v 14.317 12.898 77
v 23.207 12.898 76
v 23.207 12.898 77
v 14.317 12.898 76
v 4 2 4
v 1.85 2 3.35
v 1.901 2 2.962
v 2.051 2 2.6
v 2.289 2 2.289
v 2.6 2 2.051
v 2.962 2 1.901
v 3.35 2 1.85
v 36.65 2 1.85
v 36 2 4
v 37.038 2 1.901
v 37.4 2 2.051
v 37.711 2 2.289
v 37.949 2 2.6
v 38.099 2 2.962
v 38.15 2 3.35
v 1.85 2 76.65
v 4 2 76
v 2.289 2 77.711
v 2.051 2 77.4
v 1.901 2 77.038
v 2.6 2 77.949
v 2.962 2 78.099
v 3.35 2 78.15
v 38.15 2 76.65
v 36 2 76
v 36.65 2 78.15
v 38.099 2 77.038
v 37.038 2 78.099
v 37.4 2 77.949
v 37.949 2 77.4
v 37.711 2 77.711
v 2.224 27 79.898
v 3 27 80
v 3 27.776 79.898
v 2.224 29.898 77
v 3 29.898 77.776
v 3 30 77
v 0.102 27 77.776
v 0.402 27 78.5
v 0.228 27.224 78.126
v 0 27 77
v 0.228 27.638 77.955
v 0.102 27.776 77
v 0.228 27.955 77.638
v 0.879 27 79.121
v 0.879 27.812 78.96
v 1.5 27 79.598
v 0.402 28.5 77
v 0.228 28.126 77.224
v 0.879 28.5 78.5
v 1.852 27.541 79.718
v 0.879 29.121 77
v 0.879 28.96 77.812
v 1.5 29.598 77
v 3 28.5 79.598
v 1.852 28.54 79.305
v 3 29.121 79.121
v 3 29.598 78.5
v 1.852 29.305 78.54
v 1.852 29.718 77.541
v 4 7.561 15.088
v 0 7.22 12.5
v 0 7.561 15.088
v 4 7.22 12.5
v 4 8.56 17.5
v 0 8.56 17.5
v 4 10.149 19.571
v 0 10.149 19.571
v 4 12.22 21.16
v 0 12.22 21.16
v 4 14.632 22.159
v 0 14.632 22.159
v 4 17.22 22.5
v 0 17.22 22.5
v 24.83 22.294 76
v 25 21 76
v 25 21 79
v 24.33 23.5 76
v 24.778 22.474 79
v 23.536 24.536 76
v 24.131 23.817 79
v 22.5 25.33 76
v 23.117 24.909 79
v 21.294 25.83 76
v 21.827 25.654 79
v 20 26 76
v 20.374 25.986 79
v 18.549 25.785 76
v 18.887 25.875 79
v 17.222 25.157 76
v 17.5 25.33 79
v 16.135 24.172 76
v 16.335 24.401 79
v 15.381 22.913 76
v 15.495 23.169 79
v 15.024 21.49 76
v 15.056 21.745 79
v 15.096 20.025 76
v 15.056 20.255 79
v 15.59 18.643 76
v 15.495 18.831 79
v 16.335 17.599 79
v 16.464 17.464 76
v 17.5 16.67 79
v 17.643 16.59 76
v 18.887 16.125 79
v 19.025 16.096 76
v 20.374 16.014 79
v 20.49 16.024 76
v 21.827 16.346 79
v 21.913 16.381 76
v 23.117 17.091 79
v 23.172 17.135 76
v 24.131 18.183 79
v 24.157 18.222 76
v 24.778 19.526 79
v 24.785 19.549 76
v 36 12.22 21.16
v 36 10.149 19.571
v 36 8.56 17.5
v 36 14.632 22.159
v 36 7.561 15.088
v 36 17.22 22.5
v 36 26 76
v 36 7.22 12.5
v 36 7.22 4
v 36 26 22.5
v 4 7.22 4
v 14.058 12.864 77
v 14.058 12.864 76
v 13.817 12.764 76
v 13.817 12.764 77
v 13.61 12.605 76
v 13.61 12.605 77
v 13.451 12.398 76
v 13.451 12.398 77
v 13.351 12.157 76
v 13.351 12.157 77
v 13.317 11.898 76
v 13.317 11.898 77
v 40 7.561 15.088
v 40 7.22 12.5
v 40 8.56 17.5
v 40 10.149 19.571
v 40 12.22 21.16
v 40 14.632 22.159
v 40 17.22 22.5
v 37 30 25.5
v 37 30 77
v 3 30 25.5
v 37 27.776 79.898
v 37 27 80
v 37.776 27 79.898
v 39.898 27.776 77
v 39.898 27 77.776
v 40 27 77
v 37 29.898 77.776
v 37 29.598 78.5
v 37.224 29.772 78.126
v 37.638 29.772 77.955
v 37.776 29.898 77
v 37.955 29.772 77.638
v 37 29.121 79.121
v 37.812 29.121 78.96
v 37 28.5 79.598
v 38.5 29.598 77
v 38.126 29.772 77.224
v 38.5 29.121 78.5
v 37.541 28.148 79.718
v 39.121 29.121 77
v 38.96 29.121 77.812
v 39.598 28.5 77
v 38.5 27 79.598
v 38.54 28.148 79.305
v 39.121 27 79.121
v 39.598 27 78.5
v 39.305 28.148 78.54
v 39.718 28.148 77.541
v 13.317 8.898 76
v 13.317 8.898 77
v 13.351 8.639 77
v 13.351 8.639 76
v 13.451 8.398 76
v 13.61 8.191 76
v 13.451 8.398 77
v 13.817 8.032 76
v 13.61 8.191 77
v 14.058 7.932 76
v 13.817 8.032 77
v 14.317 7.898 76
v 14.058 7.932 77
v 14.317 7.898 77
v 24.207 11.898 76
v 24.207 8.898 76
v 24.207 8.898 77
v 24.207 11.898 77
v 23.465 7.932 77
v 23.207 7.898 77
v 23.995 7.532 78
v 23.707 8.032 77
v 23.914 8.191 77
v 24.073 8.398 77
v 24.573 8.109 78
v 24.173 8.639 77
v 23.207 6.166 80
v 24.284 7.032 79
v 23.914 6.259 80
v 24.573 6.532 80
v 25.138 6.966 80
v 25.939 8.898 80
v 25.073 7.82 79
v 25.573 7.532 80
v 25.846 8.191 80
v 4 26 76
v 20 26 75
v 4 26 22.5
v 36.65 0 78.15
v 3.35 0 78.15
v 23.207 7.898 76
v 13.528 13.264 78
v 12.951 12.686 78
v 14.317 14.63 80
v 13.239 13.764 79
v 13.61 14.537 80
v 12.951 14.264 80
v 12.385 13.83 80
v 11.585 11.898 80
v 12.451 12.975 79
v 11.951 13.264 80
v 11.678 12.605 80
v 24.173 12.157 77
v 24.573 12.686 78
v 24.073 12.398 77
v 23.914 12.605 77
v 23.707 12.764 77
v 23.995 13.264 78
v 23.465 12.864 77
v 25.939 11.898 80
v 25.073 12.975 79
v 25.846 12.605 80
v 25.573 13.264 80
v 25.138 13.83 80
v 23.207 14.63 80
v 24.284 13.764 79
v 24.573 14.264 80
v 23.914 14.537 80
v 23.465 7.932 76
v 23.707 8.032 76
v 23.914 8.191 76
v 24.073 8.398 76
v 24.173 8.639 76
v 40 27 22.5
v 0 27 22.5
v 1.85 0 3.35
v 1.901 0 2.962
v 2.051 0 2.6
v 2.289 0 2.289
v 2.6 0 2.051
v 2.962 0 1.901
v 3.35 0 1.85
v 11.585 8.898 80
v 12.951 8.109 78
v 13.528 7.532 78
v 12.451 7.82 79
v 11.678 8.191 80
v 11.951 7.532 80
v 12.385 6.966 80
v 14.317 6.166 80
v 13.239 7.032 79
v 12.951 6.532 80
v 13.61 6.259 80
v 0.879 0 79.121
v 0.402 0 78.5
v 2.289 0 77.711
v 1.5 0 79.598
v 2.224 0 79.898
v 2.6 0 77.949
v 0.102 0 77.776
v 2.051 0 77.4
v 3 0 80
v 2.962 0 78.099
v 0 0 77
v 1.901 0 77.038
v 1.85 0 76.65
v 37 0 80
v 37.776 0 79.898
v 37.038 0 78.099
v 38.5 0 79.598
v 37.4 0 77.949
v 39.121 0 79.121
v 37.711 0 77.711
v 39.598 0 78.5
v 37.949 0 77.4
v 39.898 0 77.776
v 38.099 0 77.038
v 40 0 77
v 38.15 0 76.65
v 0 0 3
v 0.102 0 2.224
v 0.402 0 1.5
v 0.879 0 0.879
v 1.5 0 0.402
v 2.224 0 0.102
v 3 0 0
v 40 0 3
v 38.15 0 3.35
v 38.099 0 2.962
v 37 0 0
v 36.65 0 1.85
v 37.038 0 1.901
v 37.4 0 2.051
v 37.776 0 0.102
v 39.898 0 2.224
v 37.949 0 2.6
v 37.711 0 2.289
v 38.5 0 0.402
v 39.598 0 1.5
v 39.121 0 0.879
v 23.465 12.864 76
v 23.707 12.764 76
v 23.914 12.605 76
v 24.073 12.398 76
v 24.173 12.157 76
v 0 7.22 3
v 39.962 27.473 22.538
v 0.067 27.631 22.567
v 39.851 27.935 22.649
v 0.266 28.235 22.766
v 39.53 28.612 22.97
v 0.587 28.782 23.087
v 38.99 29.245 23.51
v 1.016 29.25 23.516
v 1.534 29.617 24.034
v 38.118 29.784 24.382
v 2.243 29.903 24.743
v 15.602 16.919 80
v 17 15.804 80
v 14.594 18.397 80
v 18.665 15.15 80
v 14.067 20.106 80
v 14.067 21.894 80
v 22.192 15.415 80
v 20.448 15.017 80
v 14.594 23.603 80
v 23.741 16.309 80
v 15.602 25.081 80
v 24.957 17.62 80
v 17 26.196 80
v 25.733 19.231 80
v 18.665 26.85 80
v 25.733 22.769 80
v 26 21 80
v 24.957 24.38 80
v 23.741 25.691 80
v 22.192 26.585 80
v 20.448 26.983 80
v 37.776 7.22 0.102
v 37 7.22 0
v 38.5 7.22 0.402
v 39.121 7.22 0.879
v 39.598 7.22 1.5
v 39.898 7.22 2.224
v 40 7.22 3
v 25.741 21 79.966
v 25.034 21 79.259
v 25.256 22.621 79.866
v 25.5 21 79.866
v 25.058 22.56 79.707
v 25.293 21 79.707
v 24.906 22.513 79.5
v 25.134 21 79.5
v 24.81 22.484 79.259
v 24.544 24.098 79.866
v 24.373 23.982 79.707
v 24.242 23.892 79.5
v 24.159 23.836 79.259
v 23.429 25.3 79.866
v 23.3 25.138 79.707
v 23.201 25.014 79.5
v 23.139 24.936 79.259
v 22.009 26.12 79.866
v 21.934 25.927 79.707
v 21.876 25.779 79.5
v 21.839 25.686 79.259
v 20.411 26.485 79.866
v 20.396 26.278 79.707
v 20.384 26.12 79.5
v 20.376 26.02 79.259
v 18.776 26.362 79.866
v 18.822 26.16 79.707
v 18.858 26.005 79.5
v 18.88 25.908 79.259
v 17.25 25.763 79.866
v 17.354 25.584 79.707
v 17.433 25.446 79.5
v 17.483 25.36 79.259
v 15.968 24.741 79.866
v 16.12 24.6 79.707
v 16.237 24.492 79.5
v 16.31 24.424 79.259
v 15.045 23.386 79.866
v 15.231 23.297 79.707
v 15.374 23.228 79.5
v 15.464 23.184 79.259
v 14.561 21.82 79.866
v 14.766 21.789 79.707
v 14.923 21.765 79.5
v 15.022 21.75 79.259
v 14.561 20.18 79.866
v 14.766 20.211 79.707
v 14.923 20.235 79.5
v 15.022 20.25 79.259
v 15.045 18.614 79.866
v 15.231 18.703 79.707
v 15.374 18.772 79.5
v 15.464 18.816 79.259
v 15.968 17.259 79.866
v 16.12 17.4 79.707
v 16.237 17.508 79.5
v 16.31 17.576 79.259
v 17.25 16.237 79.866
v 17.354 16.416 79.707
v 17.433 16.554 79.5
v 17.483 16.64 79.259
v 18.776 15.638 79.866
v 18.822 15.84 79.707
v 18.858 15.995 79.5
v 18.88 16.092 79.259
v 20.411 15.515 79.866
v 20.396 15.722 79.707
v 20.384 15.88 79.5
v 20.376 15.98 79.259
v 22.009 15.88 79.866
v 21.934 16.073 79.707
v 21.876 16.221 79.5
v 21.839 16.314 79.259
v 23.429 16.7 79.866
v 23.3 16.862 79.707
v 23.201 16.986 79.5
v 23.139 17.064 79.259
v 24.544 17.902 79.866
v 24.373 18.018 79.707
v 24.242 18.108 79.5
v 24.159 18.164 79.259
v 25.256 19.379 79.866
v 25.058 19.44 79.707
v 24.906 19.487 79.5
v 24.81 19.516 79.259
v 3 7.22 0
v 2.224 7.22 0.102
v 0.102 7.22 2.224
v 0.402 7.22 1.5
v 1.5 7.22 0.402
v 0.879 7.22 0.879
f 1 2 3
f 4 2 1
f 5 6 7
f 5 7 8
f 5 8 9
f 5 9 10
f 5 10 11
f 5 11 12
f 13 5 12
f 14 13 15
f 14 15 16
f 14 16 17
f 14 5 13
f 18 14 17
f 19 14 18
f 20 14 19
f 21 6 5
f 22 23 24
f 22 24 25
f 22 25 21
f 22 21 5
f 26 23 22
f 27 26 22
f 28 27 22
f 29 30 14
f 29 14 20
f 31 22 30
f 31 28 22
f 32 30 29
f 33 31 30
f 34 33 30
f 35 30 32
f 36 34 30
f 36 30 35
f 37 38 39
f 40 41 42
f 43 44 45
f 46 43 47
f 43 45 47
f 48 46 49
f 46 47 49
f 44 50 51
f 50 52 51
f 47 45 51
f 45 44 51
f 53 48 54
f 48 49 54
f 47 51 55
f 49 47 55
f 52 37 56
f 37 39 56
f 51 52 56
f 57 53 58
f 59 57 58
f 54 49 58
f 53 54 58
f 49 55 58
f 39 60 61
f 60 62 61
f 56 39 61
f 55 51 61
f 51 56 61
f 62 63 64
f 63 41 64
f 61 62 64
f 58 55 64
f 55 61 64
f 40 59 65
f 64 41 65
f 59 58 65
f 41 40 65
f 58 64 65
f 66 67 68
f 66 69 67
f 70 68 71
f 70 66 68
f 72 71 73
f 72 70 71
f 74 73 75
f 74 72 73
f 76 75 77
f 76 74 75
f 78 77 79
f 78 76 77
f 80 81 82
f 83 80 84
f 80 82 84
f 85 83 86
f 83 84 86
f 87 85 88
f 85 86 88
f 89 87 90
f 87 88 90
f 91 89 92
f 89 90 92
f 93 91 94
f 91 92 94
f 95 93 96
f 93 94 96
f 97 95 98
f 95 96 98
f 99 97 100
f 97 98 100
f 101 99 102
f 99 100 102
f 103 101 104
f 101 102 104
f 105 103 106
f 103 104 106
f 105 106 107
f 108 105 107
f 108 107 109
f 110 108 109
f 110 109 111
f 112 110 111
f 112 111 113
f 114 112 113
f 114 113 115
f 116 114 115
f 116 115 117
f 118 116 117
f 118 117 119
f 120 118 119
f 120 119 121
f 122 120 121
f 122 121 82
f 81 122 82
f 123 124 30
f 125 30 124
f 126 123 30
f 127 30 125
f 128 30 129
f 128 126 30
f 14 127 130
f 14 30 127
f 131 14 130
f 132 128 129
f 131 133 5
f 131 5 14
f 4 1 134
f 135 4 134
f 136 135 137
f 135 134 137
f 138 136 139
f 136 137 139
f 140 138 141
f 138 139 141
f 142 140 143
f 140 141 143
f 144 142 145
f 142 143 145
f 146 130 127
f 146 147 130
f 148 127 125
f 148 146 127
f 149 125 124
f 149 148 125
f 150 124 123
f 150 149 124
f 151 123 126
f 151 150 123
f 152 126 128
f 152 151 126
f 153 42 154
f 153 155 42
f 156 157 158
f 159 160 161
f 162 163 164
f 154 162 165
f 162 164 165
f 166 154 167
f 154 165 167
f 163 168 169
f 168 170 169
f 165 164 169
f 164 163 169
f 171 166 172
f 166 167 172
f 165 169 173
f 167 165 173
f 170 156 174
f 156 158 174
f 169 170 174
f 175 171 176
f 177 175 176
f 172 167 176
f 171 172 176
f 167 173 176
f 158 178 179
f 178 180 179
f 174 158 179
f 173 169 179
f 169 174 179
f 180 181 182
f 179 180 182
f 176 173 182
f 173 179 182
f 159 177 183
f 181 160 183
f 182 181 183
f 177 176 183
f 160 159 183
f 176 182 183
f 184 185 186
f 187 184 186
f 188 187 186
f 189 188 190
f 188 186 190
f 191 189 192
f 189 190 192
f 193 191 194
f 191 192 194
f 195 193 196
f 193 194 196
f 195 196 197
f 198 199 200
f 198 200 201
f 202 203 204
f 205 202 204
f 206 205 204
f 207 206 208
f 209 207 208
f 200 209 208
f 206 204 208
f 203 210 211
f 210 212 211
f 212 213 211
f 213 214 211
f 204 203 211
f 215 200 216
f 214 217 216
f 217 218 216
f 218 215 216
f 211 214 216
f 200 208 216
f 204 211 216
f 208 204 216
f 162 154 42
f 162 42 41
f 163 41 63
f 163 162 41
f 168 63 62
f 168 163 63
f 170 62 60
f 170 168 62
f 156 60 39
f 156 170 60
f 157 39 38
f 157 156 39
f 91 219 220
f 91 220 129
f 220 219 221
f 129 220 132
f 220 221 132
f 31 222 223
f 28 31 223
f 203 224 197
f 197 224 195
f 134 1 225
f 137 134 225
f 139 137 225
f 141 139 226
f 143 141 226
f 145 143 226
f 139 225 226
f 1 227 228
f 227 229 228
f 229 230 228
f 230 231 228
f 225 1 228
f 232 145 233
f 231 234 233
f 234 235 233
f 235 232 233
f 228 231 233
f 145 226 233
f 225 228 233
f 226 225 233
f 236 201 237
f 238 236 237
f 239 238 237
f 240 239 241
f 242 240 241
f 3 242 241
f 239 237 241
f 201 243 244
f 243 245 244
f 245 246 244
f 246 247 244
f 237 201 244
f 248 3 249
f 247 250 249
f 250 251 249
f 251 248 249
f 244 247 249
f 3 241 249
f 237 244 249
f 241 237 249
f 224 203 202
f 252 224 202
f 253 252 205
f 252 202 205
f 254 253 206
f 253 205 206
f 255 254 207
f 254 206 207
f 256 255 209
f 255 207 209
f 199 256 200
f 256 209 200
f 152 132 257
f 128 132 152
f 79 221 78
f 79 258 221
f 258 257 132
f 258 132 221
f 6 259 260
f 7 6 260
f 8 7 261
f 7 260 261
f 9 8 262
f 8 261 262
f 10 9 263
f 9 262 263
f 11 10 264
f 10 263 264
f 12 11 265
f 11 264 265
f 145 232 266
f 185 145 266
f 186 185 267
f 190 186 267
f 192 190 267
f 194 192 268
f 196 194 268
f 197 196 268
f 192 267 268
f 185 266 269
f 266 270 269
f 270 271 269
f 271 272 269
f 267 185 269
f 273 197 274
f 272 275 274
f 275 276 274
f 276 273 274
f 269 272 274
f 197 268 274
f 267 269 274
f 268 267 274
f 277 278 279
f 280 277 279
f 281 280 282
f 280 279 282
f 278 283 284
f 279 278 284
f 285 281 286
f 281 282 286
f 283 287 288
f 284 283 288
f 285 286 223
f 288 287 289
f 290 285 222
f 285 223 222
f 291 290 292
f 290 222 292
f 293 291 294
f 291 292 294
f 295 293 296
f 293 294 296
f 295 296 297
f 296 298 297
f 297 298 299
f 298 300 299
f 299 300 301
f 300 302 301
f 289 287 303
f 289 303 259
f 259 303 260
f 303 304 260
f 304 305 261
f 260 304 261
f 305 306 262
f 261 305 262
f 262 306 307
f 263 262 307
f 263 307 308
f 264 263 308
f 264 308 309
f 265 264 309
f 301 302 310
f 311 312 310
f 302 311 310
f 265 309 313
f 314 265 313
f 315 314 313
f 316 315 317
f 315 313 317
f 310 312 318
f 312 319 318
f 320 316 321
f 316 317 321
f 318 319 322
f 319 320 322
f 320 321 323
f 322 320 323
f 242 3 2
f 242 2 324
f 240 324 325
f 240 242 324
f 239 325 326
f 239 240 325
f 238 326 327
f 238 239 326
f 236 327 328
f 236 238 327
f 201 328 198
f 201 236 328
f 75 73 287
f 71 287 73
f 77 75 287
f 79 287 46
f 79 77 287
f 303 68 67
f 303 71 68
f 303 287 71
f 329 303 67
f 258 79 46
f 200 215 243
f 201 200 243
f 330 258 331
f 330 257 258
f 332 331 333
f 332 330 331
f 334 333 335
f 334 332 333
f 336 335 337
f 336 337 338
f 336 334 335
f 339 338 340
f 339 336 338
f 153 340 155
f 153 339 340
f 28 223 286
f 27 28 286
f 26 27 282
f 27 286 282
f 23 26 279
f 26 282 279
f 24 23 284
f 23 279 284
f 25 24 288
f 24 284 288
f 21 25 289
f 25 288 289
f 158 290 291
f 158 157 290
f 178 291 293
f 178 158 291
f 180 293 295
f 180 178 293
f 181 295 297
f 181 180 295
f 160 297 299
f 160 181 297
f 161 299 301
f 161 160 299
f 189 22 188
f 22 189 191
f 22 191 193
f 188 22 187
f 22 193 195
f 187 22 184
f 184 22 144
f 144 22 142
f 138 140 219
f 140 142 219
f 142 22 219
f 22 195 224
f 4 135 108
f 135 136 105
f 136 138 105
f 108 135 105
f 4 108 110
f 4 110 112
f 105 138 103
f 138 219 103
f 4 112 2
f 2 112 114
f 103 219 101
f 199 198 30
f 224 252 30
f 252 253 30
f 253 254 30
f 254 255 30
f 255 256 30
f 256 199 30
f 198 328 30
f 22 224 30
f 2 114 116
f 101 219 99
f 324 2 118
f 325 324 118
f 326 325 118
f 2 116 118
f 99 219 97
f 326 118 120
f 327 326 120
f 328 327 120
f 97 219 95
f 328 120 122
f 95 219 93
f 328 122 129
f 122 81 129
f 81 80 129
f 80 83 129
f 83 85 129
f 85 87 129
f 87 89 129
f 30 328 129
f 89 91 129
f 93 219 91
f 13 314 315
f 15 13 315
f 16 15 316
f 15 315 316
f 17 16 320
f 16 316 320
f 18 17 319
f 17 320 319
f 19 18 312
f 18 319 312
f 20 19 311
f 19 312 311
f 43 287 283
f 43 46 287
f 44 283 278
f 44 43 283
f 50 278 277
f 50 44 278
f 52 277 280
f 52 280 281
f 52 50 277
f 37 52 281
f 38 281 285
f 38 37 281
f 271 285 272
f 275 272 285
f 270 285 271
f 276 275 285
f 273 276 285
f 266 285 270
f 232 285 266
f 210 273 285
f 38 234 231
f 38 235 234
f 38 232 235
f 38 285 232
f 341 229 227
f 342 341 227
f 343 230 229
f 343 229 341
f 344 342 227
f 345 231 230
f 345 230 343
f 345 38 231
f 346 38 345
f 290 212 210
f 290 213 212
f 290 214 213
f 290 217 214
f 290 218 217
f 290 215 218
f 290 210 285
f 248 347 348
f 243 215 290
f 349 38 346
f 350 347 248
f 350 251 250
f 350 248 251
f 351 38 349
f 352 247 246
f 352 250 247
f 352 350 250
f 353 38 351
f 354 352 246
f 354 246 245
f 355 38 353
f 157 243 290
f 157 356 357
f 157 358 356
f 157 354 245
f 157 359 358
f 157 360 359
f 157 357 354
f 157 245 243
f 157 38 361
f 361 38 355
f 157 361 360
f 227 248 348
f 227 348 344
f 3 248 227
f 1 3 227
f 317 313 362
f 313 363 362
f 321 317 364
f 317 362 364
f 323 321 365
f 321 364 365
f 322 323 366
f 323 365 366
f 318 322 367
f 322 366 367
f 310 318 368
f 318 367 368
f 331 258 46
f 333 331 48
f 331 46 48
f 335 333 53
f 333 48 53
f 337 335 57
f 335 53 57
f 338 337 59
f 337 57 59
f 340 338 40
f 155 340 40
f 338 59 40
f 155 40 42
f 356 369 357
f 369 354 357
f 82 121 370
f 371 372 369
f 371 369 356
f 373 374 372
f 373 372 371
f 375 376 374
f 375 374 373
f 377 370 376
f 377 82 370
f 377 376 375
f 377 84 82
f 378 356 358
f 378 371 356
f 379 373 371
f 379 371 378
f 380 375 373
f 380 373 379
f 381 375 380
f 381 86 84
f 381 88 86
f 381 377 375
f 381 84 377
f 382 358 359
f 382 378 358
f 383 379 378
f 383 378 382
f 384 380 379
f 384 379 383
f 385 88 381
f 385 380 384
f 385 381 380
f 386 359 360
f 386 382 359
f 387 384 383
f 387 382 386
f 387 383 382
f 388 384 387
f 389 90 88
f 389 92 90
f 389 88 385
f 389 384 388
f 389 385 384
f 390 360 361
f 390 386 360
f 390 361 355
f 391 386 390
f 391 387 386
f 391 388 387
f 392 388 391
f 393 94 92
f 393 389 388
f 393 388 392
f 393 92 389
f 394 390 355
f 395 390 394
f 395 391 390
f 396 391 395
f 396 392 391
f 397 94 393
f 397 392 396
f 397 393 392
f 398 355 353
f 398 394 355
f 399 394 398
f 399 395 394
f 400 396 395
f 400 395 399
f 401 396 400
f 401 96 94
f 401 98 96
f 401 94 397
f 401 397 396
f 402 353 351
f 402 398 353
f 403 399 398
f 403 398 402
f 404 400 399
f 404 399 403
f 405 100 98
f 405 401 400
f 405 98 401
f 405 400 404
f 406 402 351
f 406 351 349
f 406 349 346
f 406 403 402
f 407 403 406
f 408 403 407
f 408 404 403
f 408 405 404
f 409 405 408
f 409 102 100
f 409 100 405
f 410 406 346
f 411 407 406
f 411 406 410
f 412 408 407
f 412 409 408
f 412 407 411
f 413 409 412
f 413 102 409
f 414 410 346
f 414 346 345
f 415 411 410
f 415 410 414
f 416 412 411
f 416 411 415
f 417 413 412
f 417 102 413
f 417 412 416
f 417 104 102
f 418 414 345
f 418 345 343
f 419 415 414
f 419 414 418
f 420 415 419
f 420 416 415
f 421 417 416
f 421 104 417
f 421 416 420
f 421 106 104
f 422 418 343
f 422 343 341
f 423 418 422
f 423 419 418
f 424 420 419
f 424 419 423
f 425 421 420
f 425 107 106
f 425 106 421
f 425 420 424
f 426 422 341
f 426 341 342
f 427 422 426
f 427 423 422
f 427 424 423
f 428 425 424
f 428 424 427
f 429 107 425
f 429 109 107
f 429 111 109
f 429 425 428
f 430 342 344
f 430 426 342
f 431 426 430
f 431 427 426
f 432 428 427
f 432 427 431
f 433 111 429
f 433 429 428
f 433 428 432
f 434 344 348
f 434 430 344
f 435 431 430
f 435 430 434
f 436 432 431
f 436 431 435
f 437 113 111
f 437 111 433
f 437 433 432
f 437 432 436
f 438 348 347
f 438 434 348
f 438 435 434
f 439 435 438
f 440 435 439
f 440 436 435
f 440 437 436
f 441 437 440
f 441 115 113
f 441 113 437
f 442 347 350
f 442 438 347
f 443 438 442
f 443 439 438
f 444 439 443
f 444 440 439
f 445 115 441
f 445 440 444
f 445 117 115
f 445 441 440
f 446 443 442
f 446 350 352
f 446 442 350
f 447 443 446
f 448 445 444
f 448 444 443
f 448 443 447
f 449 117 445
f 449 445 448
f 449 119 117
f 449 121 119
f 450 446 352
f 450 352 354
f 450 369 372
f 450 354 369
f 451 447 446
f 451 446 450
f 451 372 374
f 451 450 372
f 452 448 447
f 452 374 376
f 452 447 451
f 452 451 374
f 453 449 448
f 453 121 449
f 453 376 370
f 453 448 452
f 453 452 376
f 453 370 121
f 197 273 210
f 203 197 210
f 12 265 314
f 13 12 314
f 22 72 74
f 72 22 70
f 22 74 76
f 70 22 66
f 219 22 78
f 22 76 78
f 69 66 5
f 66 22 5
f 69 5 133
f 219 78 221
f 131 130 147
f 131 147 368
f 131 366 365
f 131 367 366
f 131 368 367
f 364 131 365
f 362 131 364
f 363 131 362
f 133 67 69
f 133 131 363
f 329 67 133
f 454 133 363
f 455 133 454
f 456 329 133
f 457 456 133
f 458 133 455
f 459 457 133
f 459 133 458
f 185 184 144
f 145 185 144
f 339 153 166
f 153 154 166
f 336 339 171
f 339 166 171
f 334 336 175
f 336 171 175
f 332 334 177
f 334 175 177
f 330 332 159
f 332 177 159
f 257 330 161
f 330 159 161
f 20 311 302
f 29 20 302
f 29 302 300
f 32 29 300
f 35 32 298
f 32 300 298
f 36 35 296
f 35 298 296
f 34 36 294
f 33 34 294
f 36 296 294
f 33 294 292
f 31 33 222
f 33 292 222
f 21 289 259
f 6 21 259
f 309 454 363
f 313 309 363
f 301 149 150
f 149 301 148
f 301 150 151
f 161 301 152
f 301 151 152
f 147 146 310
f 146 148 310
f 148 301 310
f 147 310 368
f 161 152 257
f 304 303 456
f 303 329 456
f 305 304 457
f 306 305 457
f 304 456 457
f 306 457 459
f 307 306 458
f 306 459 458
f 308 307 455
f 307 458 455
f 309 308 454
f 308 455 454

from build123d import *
from OCP.BRepFilletAPI import BRepFilletAPI_MakeChamfer

# Parameters (mm, degrees)
SKETCH1_W           = 40
SKETCH1_H           = 30.000000000000004
BOSS_EXTRUDE1_DEPTH = 80
SHELL1_T            = -4
SKETCH2_W           = 10.889999999999999
SKETCH2_H           = 5
CUT_EXTRUDE1_DEPTH  = 91.97252332435328
FILLET1_R           = 1
CHAMFER1_SIZE       = 3
CHAMFER1_SIZE2      = 1.732050807568882
CUT_EXTRUDE2_DEPTH  = 95.33981132056604
SKETCH4_R           = 5.000000000000001
CUT_EXTRUDE3_DEPTH  = 5
FILLET2_R           = 1
FILLET3_R           = 10
FILLET4_R           = 3
CUT_EXTRUDE4_DEPTH  = 2


with BuildPart() as part:
    # Sketch1 → Boss-Extrude1 (new body)
    with BuildSketch(Plane.XY):
        with Locations((20, 15.000000000000002)):
            Rectangle(SKETCH1_W, SKETCH1_H)
    extrude(amount=BOSS_EXTRUDE1_DEPTH)

    # Shell1
    shell1_openings = [part.faces().sort_by_distance(p)[0] for p in [
        (20, 0, 40),
    ]]
    offset(amount=SHELL1_T, openings=shell1_openings, kind=Kind.INTERSECTION)

    # Sketch2 → Cut-Extrude1 (cut, through all)
    with BuildSketch(Plane(origin=(0, 0, 76), x_dir=(-1, 0, 0), z_dir=(0, 0, -1))):
        with Locations((-18.76162487822802, 10.397683125280034)):
            Rectangle(SKETCH2_W, SKETCH2_H)
    extrude(amount=-CUT_EXTRUDE1_DEPTH, mode=Mode.SUBTRACT)

    # Fillet1
    fillet1_edges = [part.edges().sort_by_distance(p)[0] for p in [
        (13.316624878228021, 12.897683125280034, 78),
        (13.316624878228021, 7.897683125280034, 78),
        (24.206624878228023, 7.897683125280034, 78),
        (24.206624878228023, 12.897683125280034, 78),
    ]]
    fillet(fillet1_edges, radius=FILLET1_R)

    # Chamfer1: one chamfer whose edges measure the first distance from different faces: ONE call of the kernel's chamfer builder (chamfer() names one face for all edges)
    chamfer1_edges_1 = [part.edges().sort_by_distance(p)[0] for p in [
        (13.316624878228021, 10.397683125280034, 80),
    ]]
    chamfer1_side_1 = [part.faces().sort_by_distance(p)[0] for p in [
        (13.316624878228021, 10.397683125280034, 78),
    ]]
    chamfer1_edges_2 = [part.edges().sort_by_distance(p)[0] for p in [
        (18.761624878228023, 7.897683125280034, 80),
    ]]
    chamfer1_side_2 = [part.faces().sort_by_distance(p)[0] for p in [
        (18.761624878228023, 7.897683125280035, 78),
    ]]
    chamfer1_edges_3 = [part.edges().sort_by_distance(p)[0] for p in [
        (18.761624878228023, 12.897683125280034, 80),
    ]]
    chamfer1_side_3 = [part.faces().sort_by_distance(p)[0] for p in [
        (18.761624878228023, 12.897683125280034, 78),
    ]]
    chamfer1_edges_4 = [part.edges().sort_by_distance(p)[0] for p in [
        (24.206624878228023, 10.397683125280034, 80),
    ]]
    chamfer1_side_4 = [part.faces().sort_by_distance(p)[0] for p in [
        (24.206624878228023, 10.397683125280034, 78),
    ]]
    chamfer1_edges_5 = [part.edges().sort_by_distance(p)[0] for p in [
        (13.609518097041473, 8.190576344093486, 80),
    ]]
    chamfer1_side_5 = [part.faces().sort_by_distance(p)[0] for p in [
        (13.609518097041473, 8.190576344093486, 78),
    ]]
    chamfer1_edges_6 = [part.edges().sort_by_distance(p)[0] for p in [
        (13.609518097041473, 12.604789906466582, 80),
    ]]
    chamfer1_side_6 = [part.faces().sort_by_distance(p)[0] for p in [
        (13.609518097041473, 12.604789906466582, 78),
    ]]
    chamfer1_edges_7 = [part.edges().sort_by_distance(p)[0] for p in [
        (23.91373165941457, 8.190576344093486, 80),
    ]]
    chamfer1_side_7 = [part.faces().sort_by_distance(p)[0] for p in [
        (23.91373165941457, 8.190576344093486, 78),
    ]]
    chamfer1_edges_8 = [part.edges().sort_by_distance(p)[0] for p in [
        (23.91373165941457, 12.604789906466582, 80),
    ]]
    chamfer1_side_8 = [part.faces().sort_by_distance(p)[0] for p in [
        (23.91373165941457, 12.604789906466582, 78),
    ]]
    chamfer1 = BRepFilletAPI_MakeChamfer(part.part.solid().wrapped)
    for e in chamfer1_edges_1:
        chamfer1.Add(CHAMFER1_SIZE, CHAMFER1_SIZE2, e.wrapped, chamfer1_side_1[0].wrapped)  # the first distance lies on this face
    for e in chamfer1_edges_2:
        chamfer1.Add(CHAMFER1_SIZE, CHAMFER1_SIZE2, e.wrapped, chamfer1_side_2[0].wrapped)  # the first distance lies on this face
    for e in chamfer1_edges_3:
        chamfer1.Add(CHAMFER1_SIZE, CHAMFER1_SIZE2, e.wrapped, chamfer1_side_3[0].wrapped)  # the first distance lies on this face
    for e in chamfer1_edges_4:
        chamfer1.Add(CHAMFER1_SIZE, CHAMFER1_SIZE2, e.wrapped, chamfer1_side_4[0].wrapped)  # the first distance lies on this face
    for e in chamfer1_edges_5:
        chamfer1.Add(CHAMFER1_SIZE, CHAMFER1_SIZE2, e.wrapped, chamfer1_side_5[0].wrapped)  # the first distance lies on this face
    for e in chamfer1_edges_6:
        chamfer1.Add(CHAMFER1_SIZE, CHAMFER1_SIZE2, e.wrapped, chamfer1_side_6[0].wrapped)  # the first distance lies on this face
    for e in chamfer1_edges_7:
        chamfer1.Add(CHAMFER1_SIZE, CHAMFER1_SIZE2, e.wrapped, chamfer1_side_7[0].wrapped)  # the first distance lies on this face
    for e in chamfer1_edges_8:
        chamfer1.Add(CHAMFER1_SIZE, CHAMFER1_SIZE2, e.wrapped, chamfer1_side_8[0].wrapped)  # the first distance lies on this face
    add(Compound.cast(chamfer1.Shape()), mode=Mode.REPLACE)

    # Sketch3 → Cut-Extrude2 (cut, through all)
    with BuildSketch(Plane.ZY):
        Polygon((0, 30), (22.5, 30), (22.5, 7.220000000000001), (1.47e-15, 7.220000000000001), align=None)
    extrude(amount=-CUT_EXTRUDE2_DEPTH, mode=Mode.SUBTRACT)

    # Sketch4 → Cut-Extrude3 (cut)
    with BuildSketch(Plane.XY.offset(80)):
        with Locations((20, 20.999999999999996)):
            Circle(SKETCH4_R)
    extrude(amount=-CUT_EXTRUDE3_DEPTH, mode=Mode.SUBTRACT)

    # Fillet2
    fillet2_edges = [part.edges().sort_by_distance(p)[0] for p in [
        (15, 20.999999999999996, 80),
    ]]
    fillet(fillet2_edges, radius=FILLET2_R)

    # Fillet3
    fillet3_edges = [part.edges().sort_by_distance(p)[0] for p in [
        (2, 7.220000000000001, 22.5),
        (38, 7.220000000000001, 22.5),
    ]]
    fillet(fillet3_edges, radius=FILLET3_R)

    # Fillet4
    fillet4_edges = [part.edges().sort_by_distance(p)[0] for p in [
        (40, 15, 80),
        (20, 30, 80),
        (0, 15, 80),
        (40, 3.6100000000000003, 0),
        (0, 30, 51.25),
        (40, 30, 51.25),
        (0, 3.6099999999999994, 0),
        (20, 30, 22.5),
    ]]
    fillet(fillet4_edges, radius=FILLET4_R)

    # Sketch5 → Cut-Extrude4 (cut)
    with BuildSketch(Plane.XZ):
        with BuildLine():
            Line((36.65, 78.14999999999998), (3.3499999999999988, 78.14999999999998))
            ThreePointArc((3.3499999999999988, 78.14999999999998), (2.2893398282201787, 77.7106601717798), (1.8500000000000005, 76.64999999999998))
            Line((1.8500000000000005, 76.64999999999998), (1.8500000000000096, 3.350000000000001))
            ThreePointArc((1.8500000000000096, 3.350000000000001), (2.2893398282201884, 2.2893398282201796), (3.35000000000001, 1.850000000000001))
            Line((3.35000000000001, 1.850000000000001), (36.65, 1.8500000000000028))
            ThreePointArc((36.65, 1.8500000000000028), (37.71066017177982, 2.289339828220177), (38.150000000000006, 3.350000000000003))
            Line((38.150000000000006, 3.350000000000003), (38.150000000000006, 76.64999999999998))
            ThreePointArc((38.150000000000006, 76.64999999999998), (37.71066017177982, 77.7106601717798), (36.65, 78.14999999999998))
        make_face()
        Polygon((4, 76), (4.000000000000009, 4.000000000000001), (36.00000000000001, 4.000000000000003), (36.00000000000001, 76), align=None, mode=Mode.SUBTRACT)
    extrude(amount=-CUT_EXTRUDE4_DEPTH, mode=Mode.SUBTRACT)


solid = part.part
